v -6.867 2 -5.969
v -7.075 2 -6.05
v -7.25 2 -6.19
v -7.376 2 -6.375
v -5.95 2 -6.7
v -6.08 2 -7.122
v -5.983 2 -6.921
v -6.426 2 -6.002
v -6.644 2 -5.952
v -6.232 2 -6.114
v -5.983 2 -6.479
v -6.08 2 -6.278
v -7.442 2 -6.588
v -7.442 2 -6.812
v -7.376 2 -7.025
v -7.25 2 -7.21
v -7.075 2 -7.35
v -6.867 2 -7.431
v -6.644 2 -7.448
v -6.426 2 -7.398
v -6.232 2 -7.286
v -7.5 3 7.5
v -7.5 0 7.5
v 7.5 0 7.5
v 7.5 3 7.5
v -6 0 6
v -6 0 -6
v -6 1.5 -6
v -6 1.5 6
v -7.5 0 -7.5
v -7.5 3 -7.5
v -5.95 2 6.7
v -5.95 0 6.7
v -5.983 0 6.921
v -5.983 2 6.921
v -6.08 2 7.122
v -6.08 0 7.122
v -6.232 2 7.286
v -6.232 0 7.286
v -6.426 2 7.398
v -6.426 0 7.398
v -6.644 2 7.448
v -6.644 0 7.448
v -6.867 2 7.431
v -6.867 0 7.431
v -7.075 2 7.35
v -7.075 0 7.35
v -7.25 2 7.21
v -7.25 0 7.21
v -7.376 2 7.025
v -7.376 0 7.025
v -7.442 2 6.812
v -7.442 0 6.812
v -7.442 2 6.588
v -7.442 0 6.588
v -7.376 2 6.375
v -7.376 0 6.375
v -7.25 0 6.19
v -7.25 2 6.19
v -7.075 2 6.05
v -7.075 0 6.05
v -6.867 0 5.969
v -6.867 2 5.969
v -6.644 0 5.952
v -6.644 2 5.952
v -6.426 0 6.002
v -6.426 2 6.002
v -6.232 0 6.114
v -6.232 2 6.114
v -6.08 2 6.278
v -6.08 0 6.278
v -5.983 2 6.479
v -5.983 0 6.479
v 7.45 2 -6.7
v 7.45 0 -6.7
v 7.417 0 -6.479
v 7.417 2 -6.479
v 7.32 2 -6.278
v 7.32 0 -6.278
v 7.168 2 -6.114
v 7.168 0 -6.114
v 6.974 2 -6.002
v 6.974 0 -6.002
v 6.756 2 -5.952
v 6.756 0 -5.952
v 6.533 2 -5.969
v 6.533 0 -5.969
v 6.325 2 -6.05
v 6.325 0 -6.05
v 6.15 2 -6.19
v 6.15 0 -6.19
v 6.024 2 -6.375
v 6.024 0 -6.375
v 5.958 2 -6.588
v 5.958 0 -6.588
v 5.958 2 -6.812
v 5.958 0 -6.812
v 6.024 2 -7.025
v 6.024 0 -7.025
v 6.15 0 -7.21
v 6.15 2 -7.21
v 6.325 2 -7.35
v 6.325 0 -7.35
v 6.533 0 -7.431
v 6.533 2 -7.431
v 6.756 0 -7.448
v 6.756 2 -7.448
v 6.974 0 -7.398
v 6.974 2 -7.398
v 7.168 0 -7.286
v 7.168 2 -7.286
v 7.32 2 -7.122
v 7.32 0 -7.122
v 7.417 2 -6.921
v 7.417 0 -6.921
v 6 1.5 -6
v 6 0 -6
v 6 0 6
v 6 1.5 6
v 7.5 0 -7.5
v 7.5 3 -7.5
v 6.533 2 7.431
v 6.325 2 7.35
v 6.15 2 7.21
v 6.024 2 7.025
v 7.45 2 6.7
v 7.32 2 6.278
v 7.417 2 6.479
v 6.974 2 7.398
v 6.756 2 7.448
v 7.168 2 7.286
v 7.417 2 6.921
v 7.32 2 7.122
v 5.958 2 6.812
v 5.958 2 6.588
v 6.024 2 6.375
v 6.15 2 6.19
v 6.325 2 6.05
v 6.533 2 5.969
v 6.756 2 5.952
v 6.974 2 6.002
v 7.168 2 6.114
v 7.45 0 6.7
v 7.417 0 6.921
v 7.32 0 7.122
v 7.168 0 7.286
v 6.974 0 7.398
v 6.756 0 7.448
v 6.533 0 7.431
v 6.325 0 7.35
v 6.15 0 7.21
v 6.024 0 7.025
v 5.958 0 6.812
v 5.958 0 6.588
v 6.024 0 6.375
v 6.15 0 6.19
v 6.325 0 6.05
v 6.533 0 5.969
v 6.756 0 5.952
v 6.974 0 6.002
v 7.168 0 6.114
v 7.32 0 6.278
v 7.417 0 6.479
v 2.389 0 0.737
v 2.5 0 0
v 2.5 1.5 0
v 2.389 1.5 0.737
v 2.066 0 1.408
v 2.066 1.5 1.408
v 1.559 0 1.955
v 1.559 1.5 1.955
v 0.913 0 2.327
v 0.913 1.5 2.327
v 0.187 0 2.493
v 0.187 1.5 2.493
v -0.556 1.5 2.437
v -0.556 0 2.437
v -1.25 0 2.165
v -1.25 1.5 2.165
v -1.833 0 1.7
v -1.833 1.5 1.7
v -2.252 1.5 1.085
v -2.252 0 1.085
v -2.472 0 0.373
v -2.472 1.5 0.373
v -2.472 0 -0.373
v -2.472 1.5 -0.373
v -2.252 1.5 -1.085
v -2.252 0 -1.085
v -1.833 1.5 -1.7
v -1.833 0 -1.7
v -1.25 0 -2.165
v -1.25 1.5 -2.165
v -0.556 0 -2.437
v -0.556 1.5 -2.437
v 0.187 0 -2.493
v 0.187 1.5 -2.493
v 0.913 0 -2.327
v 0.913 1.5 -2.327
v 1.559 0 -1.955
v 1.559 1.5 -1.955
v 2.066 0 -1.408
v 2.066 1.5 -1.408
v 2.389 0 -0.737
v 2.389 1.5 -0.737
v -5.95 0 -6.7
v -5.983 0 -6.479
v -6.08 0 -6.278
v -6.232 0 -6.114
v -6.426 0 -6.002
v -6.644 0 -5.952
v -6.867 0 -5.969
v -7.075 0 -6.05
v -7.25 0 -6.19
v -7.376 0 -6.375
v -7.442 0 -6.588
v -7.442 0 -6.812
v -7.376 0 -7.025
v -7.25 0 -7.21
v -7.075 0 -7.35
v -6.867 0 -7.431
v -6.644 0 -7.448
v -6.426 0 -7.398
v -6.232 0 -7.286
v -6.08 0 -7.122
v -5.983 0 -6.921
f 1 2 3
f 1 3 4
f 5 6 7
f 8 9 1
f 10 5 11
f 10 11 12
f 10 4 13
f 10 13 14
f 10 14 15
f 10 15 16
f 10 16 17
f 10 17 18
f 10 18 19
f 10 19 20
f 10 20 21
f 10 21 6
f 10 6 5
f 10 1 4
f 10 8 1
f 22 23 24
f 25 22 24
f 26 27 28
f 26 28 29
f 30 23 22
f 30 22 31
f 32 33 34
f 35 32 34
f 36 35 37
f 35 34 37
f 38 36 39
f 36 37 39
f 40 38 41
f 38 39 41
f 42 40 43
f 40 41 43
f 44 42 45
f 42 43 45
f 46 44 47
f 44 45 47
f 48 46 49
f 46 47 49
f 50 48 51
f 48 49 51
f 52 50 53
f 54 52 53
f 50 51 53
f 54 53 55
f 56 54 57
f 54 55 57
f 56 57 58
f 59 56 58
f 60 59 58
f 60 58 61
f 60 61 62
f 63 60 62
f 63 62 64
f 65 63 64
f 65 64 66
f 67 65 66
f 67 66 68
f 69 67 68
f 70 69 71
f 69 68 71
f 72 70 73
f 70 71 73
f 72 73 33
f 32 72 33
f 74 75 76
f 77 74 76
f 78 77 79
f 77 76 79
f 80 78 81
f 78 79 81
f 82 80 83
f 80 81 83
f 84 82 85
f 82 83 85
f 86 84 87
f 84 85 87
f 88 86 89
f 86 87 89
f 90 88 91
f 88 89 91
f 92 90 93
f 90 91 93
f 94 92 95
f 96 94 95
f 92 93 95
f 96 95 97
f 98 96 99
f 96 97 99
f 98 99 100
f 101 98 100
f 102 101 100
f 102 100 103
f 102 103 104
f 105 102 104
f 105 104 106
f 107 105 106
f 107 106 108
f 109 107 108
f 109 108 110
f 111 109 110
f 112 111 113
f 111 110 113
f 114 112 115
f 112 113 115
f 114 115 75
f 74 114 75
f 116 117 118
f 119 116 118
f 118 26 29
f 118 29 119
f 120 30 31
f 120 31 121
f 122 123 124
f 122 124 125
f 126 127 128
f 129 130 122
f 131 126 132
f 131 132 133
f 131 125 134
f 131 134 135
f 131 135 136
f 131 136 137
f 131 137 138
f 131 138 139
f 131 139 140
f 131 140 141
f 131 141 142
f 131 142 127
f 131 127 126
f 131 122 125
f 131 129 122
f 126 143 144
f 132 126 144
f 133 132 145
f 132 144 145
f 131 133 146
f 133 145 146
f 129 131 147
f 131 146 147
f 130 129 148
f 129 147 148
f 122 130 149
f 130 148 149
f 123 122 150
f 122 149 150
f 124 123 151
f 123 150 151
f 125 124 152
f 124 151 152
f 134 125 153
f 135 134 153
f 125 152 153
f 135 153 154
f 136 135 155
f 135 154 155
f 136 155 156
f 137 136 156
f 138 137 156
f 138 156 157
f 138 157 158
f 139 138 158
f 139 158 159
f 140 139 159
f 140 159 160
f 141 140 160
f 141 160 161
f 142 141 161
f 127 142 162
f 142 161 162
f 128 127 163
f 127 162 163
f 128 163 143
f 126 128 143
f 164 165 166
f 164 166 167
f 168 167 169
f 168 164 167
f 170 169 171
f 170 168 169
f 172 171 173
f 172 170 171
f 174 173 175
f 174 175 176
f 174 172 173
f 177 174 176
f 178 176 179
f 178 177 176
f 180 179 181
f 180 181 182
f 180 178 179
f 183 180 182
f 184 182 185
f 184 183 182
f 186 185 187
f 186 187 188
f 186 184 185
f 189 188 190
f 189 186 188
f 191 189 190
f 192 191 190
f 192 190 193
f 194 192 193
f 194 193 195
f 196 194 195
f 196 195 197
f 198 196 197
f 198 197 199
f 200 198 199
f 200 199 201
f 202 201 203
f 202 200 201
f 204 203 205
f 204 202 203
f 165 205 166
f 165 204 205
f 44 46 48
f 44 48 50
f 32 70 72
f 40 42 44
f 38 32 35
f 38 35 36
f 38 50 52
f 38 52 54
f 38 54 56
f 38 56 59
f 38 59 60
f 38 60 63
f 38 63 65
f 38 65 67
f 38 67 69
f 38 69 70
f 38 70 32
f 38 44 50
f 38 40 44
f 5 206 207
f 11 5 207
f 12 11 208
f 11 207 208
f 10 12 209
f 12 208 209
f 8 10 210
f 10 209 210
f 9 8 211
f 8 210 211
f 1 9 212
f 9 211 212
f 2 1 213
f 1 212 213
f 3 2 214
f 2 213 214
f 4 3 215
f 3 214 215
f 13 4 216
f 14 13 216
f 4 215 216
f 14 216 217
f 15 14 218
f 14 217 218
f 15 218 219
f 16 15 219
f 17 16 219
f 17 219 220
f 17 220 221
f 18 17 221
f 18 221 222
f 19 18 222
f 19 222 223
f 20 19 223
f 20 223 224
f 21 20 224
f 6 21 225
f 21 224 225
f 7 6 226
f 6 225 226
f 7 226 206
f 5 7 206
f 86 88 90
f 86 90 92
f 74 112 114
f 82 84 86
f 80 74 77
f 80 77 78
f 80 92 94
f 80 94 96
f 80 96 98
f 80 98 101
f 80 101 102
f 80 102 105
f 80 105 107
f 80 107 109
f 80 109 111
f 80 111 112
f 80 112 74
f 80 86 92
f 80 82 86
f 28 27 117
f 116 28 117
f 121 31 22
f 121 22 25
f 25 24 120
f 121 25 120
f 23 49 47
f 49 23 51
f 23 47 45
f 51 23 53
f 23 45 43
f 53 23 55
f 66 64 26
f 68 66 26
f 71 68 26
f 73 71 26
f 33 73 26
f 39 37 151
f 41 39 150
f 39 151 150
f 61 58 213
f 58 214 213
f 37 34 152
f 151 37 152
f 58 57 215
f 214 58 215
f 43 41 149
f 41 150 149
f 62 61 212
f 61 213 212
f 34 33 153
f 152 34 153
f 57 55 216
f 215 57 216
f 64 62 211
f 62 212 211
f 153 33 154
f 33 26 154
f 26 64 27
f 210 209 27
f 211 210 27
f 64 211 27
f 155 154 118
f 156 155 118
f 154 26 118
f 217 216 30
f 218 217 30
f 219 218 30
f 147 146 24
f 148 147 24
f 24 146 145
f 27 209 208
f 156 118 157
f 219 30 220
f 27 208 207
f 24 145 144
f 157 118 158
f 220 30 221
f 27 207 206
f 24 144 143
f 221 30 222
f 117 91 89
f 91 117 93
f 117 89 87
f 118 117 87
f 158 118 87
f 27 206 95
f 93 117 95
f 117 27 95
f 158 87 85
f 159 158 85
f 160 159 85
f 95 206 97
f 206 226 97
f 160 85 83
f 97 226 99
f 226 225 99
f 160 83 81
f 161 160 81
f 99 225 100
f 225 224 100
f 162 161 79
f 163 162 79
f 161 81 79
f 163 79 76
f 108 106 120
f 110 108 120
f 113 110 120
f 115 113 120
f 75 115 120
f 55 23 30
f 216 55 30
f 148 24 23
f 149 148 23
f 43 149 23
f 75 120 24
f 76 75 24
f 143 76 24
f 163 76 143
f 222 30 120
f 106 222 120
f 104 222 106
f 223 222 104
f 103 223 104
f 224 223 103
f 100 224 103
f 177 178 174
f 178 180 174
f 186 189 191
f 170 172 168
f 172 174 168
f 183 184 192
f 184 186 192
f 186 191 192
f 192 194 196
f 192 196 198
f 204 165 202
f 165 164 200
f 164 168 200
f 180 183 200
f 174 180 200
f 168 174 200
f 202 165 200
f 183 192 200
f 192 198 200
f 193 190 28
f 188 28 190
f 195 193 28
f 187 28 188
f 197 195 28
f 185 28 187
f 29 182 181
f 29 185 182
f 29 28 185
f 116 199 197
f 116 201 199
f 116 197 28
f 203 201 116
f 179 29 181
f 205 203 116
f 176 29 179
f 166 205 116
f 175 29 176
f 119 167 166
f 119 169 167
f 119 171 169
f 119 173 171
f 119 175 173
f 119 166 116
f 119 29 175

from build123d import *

# Parameters (mm, degrees)
SKETCH1_W           = 15
SKETCH1_H           = 15
BOSS_EXTRUDE1_DEPTH = 3
SKETCH2_W           = 12
SKETCH2_H           = 12
SKETCH2_R           = 2.5
CUT_EXTRUDE1_DEPTH  = 1.5
SKETCH3_R           = 0.75
CUT_EXTRUDE2_DEPTH  = 2


with BuildPart() as part:
    # Sketch1 → Boss-Extrude1 (new body)
    with BuildSketch(Plane(origin=(0, 0, 0), x_dir=(1, 0, 0), z_dir=(0, 1, 0))):
        Rectangle(SKETCH1_W, SKETCH1_H)
    extrude(amount=BOSS_EXTRUDE1_DEPTH)

    # Sketch2 → Cut-Extrude1 (cut)
    with BuildSketch(Plane.XZ):
        Rectangle(SKETCH2_W, SKETCH2_H)
        Circle(SKETCH2_R, mode=Mode.SUBTRACT)
    extrude(amount=-CUT_EXTRUDE1_DEPTH, mode=Mode.SUBTRACT)

    # Sketch3 → Cut-Extrude2 (cut)
    with BuildSketch(Plane.XZ):
        with Locations((-6.7, 6.7)):
            Circle(SKETCH3_R)
        with Locations((6.7, 6.7)):
            Circle(SKETCH3_R)
        with Locations((6.7, -6.7)):
            Circle(SKETCH3_R)
        with Locations((-6.7, -6.7)):
            Circle(SKETCH3_R)
    extrude(amount=-CUT_EXTRUDE2_DEPTH, mode=Mode.SUBTRACT)


solid = part.part
